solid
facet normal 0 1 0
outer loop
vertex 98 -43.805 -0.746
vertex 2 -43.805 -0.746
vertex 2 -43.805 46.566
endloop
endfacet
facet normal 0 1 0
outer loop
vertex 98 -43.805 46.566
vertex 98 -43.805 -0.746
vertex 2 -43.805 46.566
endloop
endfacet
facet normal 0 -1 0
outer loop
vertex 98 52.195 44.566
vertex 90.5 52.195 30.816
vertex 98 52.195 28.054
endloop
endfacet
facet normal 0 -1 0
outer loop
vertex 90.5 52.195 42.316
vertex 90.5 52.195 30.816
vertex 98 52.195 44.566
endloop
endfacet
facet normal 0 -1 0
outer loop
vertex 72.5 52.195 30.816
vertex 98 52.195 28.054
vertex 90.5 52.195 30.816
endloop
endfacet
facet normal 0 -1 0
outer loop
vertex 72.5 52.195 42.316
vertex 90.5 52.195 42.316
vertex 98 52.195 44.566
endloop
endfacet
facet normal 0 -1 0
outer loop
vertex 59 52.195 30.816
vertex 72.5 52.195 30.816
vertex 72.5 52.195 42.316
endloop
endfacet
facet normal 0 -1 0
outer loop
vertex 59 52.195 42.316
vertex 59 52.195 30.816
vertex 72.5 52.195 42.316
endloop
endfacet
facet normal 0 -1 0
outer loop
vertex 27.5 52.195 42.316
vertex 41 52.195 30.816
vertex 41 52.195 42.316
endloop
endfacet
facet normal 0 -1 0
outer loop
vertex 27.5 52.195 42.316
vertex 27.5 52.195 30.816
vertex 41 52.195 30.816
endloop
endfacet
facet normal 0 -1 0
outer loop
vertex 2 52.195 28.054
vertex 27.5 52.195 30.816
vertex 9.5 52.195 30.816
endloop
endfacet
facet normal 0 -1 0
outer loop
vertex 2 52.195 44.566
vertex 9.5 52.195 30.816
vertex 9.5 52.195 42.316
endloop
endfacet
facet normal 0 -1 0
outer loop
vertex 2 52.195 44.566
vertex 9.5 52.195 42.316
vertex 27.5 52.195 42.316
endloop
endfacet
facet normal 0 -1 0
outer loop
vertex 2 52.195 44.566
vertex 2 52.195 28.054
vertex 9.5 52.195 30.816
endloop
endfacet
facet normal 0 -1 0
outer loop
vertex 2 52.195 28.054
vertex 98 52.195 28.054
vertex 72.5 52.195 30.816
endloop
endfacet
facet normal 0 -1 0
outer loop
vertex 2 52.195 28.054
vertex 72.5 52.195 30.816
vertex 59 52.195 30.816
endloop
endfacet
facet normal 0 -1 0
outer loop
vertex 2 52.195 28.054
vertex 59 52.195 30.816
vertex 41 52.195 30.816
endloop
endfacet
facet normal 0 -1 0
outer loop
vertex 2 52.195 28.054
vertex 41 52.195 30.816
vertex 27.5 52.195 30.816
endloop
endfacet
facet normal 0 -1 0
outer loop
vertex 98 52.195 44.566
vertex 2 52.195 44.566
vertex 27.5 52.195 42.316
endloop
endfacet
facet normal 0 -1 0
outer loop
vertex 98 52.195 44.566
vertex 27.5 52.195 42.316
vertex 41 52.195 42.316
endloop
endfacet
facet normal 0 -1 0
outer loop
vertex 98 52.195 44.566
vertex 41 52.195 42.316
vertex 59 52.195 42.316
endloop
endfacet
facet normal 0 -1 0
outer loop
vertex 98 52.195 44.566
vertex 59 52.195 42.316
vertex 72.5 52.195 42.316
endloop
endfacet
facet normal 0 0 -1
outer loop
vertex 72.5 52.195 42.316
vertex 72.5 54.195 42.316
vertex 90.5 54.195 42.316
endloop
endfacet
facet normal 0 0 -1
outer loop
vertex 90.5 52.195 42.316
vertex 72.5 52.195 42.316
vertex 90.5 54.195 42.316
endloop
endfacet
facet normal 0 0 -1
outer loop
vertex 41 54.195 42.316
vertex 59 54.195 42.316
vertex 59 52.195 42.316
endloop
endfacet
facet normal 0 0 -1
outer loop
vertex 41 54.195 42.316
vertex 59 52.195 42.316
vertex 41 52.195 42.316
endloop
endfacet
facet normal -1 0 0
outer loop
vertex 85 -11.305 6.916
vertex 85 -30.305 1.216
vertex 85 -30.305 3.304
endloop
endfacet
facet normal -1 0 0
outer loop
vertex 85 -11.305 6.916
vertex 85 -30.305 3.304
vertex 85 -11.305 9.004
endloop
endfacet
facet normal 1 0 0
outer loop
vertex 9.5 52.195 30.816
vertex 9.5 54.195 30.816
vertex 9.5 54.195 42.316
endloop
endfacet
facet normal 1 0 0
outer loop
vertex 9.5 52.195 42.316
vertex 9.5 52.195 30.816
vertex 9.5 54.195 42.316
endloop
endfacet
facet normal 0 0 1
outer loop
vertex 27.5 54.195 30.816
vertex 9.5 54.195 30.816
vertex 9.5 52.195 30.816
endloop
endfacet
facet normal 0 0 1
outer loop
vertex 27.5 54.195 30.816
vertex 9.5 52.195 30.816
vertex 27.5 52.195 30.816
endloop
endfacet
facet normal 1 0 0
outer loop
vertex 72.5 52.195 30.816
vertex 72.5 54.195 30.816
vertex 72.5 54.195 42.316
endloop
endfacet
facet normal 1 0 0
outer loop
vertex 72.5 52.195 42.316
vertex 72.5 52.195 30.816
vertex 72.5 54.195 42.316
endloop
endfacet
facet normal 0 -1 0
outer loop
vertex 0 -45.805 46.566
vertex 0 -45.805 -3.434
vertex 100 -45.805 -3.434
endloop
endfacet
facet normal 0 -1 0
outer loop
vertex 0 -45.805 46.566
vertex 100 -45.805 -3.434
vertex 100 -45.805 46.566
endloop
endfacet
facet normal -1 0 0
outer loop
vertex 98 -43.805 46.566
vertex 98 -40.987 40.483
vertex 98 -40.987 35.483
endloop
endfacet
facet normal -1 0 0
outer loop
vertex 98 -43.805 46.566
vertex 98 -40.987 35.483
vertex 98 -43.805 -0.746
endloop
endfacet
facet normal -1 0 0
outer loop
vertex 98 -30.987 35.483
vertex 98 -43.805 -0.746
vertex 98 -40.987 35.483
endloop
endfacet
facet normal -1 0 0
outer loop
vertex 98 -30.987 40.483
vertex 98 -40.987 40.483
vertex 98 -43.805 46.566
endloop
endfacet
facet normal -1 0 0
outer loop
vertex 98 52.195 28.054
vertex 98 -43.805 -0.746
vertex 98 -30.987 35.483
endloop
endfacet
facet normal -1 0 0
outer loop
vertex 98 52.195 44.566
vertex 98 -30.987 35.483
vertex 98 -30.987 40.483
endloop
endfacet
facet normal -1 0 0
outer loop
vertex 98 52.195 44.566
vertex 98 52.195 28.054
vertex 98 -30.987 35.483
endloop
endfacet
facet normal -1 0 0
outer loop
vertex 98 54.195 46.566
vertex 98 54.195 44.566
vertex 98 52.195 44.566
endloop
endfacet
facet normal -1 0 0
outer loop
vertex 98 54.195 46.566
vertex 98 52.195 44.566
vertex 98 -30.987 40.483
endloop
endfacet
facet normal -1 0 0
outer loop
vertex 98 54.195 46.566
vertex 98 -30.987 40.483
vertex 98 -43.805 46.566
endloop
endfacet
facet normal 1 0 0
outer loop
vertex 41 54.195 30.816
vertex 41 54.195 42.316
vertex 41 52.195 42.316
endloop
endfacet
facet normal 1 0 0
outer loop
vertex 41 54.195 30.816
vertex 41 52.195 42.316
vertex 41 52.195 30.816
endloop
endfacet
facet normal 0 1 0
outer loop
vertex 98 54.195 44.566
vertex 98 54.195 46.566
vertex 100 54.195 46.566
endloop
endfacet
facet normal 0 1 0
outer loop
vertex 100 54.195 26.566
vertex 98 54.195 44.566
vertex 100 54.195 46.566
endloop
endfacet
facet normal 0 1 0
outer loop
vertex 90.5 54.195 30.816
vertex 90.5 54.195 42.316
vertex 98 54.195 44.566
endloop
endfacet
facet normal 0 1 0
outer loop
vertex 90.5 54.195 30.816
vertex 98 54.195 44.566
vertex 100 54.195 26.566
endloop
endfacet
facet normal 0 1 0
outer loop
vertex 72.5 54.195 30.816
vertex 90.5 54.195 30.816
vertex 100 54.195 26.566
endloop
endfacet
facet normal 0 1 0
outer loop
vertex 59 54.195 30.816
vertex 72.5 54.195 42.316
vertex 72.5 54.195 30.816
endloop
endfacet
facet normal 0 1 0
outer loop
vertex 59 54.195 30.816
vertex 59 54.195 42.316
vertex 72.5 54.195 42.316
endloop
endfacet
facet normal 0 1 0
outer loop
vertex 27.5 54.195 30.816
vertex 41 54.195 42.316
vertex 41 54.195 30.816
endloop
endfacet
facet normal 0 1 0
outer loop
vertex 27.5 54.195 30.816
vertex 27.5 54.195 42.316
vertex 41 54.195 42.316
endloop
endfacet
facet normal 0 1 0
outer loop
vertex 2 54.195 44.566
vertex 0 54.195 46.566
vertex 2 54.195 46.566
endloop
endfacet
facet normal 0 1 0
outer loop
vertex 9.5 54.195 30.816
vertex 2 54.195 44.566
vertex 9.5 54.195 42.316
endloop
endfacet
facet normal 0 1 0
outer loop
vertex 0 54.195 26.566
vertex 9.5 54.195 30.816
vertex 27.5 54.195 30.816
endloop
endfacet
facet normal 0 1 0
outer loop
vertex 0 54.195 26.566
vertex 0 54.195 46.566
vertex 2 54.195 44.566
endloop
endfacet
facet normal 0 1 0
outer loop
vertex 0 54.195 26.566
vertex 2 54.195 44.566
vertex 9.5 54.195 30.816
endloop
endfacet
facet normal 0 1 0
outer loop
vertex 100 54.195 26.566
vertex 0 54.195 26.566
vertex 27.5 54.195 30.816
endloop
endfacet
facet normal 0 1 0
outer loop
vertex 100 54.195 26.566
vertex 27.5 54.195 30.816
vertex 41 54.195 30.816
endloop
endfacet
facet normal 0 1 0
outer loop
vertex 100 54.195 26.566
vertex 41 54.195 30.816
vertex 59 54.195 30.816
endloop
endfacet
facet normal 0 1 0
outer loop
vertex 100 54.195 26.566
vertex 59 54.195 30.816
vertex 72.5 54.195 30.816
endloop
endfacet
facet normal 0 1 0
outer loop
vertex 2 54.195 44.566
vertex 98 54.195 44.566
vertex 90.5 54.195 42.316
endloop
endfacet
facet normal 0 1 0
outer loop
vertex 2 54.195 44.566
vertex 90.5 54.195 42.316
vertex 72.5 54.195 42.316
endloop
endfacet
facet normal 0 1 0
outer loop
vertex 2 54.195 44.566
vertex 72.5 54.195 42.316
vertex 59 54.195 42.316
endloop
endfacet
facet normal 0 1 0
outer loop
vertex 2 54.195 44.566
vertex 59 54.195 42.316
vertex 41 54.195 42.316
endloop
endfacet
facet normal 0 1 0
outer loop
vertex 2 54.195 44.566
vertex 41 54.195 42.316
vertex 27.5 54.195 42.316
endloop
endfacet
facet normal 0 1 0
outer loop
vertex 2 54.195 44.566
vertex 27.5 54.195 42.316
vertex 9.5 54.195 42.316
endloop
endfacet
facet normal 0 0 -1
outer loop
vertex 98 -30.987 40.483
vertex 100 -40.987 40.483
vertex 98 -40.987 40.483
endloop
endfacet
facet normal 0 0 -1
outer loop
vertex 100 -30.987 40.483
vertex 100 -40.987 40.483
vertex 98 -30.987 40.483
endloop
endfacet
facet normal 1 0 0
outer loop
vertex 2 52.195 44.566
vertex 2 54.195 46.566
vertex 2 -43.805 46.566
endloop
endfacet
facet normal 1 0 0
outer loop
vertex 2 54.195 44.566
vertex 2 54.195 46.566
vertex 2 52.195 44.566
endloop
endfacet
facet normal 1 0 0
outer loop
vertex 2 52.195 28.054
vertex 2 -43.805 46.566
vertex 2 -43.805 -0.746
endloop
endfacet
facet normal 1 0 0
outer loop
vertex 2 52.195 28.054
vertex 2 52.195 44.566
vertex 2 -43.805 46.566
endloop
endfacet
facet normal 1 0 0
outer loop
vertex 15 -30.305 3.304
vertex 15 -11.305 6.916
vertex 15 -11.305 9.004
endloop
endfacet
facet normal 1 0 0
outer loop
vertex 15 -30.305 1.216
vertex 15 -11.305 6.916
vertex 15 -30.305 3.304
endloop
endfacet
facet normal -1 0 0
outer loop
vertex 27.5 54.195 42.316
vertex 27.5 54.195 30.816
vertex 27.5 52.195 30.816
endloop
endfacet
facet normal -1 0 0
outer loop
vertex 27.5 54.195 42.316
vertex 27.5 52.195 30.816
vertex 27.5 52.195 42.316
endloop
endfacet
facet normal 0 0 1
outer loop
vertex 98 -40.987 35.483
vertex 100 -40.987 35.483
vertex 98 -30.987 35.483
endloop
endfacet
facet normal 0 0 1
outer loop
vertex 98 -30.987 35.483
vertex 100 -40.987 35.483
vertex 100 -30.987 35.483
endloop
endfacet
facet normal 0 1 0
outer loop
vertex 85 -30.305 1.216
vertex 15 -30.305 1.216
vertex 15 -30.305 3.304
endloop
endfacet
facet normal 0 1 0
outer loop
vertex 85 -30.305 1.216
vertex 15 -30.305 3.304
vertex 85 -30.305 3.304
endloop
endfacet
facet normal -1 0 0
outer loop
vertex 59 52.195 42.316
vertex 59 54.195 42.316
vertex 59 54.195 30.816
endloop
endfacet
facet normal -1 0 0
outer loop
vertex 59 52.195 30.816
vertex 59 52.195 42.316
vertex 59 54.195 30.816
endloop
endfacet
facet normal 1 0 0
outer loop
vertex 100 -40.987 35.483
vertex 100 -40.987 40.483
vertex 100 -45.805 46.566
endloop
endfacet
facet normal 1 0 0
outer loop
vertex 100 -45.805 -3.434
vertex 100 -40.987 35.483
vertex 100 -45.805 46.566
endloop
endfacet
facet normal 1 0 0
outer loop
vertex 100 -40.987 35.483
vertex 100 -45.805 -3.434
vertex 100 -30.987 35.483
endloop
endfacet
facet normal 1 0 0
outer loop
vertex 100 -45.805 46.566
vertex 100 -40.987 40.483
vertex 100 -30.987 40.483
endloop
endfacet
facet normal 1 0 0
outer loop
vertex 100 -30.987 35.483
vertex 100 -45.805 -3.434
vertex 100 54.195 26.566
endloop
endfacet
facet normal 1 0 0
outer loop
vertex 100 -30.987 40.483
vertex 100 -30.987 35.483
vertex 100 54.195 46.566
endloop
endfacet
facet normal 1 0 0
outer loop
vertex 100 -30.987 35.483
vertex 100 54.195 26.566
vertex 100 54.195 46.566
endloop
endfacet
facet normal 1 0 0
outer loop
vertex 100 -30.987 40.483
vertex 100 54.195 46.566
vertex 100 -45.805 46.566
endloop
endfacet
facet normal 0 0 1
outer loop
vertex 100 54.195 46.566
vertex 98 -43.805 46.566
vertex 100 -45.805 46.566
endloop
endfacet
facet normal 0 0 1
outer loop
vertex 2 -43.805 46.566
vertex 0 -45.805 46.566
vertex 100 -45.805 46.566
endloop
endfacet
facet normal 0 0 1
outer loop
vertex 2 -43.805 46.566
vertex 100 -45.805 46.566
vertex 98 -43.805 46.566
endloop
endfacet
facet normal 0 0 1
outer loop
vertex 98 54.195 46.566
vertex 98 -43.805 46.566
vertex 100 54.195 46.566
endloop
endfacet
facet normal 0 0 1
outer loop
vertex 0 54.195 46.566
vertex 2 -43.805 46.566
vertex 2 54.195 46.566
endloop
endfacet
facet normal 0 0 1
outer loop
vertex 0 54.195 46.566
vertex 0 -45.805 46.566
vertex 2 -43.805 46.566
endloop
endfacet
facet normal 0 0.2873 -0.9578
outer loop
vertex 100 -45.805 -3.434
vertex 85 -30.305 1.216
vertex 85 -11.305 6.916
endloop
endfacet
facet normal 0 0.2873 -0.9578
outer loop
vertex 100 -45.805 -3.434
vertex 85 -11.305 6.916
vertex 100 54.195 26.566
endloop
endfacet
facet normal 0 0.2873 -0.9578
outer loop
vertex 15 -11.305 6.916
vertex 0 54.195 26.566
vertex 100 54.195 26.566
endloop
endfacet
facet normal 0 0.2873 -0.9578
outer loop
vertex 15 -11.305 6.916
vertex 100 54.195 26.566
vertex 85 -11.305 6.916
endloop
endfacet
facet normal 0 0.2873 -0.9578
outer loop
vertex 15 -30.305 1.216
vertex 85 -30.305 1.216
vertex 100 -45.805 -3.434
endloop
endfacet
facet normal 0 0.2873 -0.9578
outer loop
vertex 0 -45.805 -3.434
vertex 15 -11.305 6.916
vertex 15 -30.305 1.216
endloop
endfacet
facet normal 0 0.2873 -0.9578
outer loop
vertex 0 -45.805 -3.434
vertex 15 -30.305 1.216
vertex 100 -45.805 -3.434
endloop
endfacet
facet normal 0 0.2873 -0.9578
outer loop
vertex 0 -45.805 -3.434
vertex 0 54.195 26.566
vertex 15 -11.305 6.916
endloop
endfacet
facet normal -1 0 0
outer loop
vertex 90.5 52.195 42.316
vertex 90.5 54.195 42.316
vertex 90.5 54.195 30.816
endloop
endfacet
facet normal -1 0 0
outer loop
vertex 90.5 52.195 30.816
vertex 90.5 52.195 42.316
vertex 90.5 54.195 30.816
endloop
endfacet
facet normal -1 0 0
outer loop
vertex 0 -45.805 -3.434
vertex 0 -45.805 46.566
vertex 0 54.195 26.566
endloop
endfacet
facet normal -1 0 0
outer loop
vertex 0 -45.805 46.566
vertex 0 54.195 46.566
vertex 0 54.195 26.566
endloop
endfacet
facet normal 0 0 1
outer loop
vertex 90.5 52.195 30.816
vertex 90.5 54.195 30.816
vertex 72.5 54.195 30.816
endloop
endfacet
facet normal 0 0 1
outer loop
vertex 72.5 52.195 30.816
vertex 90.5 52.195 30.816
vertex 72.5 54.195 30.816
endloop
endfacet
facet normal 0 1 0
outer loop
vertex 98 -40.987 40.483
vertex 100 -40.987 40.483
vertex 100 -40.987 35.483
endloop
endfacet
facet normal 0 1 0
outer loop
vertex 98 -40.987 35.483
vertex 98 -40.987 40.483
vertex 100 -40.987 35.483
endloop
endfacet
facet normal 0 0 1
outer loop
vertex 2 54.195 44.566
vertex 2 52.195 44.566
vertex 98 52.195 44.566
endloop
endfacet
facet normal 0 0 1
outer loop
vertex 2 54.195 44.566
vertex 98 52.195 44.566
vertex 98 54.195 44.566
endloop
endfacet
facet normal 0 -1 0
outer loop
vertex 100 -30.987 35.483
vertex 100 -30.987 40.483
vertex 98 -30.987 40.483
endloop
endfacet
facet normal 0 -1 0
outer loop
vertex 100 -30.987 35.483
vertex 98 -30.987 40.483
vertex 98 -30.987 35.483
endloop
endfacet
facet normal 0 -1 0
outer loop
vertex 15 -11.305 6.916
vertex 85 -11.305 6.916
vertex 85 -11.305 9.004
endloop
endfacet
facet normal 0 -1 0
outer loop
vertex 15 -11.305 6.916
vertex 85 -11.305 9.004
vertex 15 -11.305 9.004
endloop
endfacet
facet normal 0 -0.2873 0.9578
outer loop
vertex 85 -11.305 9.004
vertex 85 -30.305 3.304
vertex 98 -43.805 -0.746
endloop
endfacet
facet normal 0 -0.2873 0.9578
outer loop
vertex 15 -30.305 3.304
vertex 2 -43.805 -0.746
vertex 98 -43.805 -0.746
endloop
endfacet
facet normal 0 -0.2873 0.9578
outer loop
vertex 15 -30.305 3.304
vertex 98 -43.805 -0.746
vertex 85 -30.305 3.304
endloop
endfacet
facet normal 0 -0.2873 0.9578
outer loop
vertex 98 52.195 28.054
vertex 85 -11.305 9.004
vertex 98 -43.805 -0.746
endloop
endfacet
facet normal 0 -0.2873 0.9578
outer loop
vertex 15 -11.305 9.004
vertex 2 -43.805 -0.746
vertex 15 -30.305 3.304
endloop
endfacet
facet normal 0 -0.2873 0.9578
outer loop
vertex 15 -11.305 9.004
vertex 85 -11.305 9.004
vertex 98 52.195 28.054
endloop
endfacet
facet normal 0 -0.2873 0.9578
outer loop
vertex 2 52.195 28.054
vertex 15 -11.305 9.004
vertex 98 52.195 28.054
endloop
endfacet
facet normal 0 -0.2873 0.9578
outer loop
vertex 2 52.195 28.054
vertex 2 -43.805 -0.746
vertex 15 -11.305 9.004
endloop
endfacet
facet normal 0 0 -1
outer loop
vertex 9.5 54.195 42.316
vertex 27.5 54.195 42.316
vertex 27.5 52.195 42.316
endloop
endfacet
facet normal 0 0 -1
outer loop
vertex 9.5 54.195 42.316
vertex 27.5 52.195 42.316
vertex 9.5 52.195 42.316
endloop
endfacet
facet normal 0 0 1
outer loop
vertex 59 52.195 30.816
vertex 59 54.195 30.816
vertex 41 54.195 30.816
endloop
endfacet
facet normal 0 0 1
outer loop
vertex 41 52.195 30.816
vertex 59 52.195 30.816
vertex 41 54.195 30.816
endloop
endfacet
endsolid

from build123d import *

# Parameters (mm, degrees)
BOSS_EXTRUDE1_DEPTH     = 2
BOSS_EXTRUDE2_DEPTH     = 96
BOSS_EXTRUDE3_DEPTH     = 2
CUT_EXTRUDE1_DEPTH      = 2
CUT_EXTRUDE2_DEPTH      = 20
CUT_EXTRUDE2_DEPTH_BACK = 2
SKETCH6_W               = 5
SKETCH6_H               = 10
CUT_EXTRUDE3_DEPTH      = 2


with BuildPart() as part:
    # Sketch1 → Boss-Extrude1 (new body)
    with BuildSketch(Plane(origin=(0, 0, 0), x_dir=(0, 0, -1), z_dir=(1, 0, 0))):
        Polygon((-46.565590075, -45.805369128), (3.434409925, -45.805369128), (-26.565590075, 54.194630872), (-46.565590075, 54.194630872), align=None)
    extrude(amount=BOSS_EXTRUDE1_DEPTH)

    # Sketch2 → Boss-Extrude2 (add)
    with BuildSketch(Plane(origin=(2, 0, 0), x_dir=(0, 0, -1), z_dir=(1, 0, 0))):
        Polygon((-26.565590075, 54.194630872), (3.434409925, -45.805369128), (-44.565590075, -45.805369128), (-46.565590075, -45.805369128), (-46.565590075, -43.805369128), (-44.565590075, -43.805369128), (0.746348624, -43.805369128), (-28.053651376, 52.194630872), (-44.565590075, 52.194630872), (-44.565590075, 54.194630872), align=None)
    extrude(amount=BOSS_EXTRUDE2_DEPTH)

    # Sketch3 → Boss-Extrude3 (add)
    with BuildSketch(Plane(origin=(98, 0, 0), x_dir=(0, 0, -1), z_dir=(1, 0, 0))):
        Polygon((-46.565590075, 54.194630872), (-26.565590075, 54.194630872), (3.434409925, -45.805369128), (-46.565590075, -45.805369128), align=None)
    extrude(amount=BOSS_EXTRUDE3_DEPTH)

    # Sketch4 → Cut-Extrude1 (cut)
    with BuildSketch(Plane(origin=(0, 54.194630872, 0), x_dir=(1, 0, 0), z_dir=(0, 1, 0))):
        Polygon((50, -30.815590075), (59, -30.815590075), (59, -36.565590075), (59, -42.315590075), (41, -42.315590075), (41, -30.815590075), align=None)
        Polygon((72.5, -30.815590075), (72.5, -42.315590075), (90.5, -42.315590075), (90.5, -36.565590075), (90.5, -30.815590075), align=None)
        Polygon((27.5, -30.815590075), (27.5, -42.315590075), (9.5, -42.315590075), (9.5, -36.565590075), (9.5, -30.815590075), align=None)
    extrude(amount=-CUT_EXTRUDE1_DEPTH, mode=Mode.SUBTRACT)

    # Sketch5 → Cut-Extrude2 (cut, two sides: drawn at the far end of the back side and taken through both)
    with BuildSketch(Plane.XY.offset(-CUT_EXTRUDE2_DEPTH_BACK)):
        Polygon((85, -11.305369128), (50, -11.305369128), (15, -11.305369128), (15, -20.805369128), (15, -30.305369128), (85, -30.305369128), align=None)
    extrude(amount=CUT_EXTRUDE2_DEPTH + CUT_EXTRUDE2_DEPTH_BACK, mode=Mode.SUBTRACT)

    # Sketch6 → Cut-Extrude3 (cut)
    with BuildSketch(Plane(origin=(100, 0, 0), x_dir=(0, 0, -1), z_dir=(1, 0, 0))):
        with Locations((-37.982930648, -35.987256773)):
            Rectangle(SKETCH6_W, SKETCH6_H)
    extrude(amount=-CUT_EXTRUDE3_DEPTH, mode=Mode.SUBTRACT)


solid = part.part
